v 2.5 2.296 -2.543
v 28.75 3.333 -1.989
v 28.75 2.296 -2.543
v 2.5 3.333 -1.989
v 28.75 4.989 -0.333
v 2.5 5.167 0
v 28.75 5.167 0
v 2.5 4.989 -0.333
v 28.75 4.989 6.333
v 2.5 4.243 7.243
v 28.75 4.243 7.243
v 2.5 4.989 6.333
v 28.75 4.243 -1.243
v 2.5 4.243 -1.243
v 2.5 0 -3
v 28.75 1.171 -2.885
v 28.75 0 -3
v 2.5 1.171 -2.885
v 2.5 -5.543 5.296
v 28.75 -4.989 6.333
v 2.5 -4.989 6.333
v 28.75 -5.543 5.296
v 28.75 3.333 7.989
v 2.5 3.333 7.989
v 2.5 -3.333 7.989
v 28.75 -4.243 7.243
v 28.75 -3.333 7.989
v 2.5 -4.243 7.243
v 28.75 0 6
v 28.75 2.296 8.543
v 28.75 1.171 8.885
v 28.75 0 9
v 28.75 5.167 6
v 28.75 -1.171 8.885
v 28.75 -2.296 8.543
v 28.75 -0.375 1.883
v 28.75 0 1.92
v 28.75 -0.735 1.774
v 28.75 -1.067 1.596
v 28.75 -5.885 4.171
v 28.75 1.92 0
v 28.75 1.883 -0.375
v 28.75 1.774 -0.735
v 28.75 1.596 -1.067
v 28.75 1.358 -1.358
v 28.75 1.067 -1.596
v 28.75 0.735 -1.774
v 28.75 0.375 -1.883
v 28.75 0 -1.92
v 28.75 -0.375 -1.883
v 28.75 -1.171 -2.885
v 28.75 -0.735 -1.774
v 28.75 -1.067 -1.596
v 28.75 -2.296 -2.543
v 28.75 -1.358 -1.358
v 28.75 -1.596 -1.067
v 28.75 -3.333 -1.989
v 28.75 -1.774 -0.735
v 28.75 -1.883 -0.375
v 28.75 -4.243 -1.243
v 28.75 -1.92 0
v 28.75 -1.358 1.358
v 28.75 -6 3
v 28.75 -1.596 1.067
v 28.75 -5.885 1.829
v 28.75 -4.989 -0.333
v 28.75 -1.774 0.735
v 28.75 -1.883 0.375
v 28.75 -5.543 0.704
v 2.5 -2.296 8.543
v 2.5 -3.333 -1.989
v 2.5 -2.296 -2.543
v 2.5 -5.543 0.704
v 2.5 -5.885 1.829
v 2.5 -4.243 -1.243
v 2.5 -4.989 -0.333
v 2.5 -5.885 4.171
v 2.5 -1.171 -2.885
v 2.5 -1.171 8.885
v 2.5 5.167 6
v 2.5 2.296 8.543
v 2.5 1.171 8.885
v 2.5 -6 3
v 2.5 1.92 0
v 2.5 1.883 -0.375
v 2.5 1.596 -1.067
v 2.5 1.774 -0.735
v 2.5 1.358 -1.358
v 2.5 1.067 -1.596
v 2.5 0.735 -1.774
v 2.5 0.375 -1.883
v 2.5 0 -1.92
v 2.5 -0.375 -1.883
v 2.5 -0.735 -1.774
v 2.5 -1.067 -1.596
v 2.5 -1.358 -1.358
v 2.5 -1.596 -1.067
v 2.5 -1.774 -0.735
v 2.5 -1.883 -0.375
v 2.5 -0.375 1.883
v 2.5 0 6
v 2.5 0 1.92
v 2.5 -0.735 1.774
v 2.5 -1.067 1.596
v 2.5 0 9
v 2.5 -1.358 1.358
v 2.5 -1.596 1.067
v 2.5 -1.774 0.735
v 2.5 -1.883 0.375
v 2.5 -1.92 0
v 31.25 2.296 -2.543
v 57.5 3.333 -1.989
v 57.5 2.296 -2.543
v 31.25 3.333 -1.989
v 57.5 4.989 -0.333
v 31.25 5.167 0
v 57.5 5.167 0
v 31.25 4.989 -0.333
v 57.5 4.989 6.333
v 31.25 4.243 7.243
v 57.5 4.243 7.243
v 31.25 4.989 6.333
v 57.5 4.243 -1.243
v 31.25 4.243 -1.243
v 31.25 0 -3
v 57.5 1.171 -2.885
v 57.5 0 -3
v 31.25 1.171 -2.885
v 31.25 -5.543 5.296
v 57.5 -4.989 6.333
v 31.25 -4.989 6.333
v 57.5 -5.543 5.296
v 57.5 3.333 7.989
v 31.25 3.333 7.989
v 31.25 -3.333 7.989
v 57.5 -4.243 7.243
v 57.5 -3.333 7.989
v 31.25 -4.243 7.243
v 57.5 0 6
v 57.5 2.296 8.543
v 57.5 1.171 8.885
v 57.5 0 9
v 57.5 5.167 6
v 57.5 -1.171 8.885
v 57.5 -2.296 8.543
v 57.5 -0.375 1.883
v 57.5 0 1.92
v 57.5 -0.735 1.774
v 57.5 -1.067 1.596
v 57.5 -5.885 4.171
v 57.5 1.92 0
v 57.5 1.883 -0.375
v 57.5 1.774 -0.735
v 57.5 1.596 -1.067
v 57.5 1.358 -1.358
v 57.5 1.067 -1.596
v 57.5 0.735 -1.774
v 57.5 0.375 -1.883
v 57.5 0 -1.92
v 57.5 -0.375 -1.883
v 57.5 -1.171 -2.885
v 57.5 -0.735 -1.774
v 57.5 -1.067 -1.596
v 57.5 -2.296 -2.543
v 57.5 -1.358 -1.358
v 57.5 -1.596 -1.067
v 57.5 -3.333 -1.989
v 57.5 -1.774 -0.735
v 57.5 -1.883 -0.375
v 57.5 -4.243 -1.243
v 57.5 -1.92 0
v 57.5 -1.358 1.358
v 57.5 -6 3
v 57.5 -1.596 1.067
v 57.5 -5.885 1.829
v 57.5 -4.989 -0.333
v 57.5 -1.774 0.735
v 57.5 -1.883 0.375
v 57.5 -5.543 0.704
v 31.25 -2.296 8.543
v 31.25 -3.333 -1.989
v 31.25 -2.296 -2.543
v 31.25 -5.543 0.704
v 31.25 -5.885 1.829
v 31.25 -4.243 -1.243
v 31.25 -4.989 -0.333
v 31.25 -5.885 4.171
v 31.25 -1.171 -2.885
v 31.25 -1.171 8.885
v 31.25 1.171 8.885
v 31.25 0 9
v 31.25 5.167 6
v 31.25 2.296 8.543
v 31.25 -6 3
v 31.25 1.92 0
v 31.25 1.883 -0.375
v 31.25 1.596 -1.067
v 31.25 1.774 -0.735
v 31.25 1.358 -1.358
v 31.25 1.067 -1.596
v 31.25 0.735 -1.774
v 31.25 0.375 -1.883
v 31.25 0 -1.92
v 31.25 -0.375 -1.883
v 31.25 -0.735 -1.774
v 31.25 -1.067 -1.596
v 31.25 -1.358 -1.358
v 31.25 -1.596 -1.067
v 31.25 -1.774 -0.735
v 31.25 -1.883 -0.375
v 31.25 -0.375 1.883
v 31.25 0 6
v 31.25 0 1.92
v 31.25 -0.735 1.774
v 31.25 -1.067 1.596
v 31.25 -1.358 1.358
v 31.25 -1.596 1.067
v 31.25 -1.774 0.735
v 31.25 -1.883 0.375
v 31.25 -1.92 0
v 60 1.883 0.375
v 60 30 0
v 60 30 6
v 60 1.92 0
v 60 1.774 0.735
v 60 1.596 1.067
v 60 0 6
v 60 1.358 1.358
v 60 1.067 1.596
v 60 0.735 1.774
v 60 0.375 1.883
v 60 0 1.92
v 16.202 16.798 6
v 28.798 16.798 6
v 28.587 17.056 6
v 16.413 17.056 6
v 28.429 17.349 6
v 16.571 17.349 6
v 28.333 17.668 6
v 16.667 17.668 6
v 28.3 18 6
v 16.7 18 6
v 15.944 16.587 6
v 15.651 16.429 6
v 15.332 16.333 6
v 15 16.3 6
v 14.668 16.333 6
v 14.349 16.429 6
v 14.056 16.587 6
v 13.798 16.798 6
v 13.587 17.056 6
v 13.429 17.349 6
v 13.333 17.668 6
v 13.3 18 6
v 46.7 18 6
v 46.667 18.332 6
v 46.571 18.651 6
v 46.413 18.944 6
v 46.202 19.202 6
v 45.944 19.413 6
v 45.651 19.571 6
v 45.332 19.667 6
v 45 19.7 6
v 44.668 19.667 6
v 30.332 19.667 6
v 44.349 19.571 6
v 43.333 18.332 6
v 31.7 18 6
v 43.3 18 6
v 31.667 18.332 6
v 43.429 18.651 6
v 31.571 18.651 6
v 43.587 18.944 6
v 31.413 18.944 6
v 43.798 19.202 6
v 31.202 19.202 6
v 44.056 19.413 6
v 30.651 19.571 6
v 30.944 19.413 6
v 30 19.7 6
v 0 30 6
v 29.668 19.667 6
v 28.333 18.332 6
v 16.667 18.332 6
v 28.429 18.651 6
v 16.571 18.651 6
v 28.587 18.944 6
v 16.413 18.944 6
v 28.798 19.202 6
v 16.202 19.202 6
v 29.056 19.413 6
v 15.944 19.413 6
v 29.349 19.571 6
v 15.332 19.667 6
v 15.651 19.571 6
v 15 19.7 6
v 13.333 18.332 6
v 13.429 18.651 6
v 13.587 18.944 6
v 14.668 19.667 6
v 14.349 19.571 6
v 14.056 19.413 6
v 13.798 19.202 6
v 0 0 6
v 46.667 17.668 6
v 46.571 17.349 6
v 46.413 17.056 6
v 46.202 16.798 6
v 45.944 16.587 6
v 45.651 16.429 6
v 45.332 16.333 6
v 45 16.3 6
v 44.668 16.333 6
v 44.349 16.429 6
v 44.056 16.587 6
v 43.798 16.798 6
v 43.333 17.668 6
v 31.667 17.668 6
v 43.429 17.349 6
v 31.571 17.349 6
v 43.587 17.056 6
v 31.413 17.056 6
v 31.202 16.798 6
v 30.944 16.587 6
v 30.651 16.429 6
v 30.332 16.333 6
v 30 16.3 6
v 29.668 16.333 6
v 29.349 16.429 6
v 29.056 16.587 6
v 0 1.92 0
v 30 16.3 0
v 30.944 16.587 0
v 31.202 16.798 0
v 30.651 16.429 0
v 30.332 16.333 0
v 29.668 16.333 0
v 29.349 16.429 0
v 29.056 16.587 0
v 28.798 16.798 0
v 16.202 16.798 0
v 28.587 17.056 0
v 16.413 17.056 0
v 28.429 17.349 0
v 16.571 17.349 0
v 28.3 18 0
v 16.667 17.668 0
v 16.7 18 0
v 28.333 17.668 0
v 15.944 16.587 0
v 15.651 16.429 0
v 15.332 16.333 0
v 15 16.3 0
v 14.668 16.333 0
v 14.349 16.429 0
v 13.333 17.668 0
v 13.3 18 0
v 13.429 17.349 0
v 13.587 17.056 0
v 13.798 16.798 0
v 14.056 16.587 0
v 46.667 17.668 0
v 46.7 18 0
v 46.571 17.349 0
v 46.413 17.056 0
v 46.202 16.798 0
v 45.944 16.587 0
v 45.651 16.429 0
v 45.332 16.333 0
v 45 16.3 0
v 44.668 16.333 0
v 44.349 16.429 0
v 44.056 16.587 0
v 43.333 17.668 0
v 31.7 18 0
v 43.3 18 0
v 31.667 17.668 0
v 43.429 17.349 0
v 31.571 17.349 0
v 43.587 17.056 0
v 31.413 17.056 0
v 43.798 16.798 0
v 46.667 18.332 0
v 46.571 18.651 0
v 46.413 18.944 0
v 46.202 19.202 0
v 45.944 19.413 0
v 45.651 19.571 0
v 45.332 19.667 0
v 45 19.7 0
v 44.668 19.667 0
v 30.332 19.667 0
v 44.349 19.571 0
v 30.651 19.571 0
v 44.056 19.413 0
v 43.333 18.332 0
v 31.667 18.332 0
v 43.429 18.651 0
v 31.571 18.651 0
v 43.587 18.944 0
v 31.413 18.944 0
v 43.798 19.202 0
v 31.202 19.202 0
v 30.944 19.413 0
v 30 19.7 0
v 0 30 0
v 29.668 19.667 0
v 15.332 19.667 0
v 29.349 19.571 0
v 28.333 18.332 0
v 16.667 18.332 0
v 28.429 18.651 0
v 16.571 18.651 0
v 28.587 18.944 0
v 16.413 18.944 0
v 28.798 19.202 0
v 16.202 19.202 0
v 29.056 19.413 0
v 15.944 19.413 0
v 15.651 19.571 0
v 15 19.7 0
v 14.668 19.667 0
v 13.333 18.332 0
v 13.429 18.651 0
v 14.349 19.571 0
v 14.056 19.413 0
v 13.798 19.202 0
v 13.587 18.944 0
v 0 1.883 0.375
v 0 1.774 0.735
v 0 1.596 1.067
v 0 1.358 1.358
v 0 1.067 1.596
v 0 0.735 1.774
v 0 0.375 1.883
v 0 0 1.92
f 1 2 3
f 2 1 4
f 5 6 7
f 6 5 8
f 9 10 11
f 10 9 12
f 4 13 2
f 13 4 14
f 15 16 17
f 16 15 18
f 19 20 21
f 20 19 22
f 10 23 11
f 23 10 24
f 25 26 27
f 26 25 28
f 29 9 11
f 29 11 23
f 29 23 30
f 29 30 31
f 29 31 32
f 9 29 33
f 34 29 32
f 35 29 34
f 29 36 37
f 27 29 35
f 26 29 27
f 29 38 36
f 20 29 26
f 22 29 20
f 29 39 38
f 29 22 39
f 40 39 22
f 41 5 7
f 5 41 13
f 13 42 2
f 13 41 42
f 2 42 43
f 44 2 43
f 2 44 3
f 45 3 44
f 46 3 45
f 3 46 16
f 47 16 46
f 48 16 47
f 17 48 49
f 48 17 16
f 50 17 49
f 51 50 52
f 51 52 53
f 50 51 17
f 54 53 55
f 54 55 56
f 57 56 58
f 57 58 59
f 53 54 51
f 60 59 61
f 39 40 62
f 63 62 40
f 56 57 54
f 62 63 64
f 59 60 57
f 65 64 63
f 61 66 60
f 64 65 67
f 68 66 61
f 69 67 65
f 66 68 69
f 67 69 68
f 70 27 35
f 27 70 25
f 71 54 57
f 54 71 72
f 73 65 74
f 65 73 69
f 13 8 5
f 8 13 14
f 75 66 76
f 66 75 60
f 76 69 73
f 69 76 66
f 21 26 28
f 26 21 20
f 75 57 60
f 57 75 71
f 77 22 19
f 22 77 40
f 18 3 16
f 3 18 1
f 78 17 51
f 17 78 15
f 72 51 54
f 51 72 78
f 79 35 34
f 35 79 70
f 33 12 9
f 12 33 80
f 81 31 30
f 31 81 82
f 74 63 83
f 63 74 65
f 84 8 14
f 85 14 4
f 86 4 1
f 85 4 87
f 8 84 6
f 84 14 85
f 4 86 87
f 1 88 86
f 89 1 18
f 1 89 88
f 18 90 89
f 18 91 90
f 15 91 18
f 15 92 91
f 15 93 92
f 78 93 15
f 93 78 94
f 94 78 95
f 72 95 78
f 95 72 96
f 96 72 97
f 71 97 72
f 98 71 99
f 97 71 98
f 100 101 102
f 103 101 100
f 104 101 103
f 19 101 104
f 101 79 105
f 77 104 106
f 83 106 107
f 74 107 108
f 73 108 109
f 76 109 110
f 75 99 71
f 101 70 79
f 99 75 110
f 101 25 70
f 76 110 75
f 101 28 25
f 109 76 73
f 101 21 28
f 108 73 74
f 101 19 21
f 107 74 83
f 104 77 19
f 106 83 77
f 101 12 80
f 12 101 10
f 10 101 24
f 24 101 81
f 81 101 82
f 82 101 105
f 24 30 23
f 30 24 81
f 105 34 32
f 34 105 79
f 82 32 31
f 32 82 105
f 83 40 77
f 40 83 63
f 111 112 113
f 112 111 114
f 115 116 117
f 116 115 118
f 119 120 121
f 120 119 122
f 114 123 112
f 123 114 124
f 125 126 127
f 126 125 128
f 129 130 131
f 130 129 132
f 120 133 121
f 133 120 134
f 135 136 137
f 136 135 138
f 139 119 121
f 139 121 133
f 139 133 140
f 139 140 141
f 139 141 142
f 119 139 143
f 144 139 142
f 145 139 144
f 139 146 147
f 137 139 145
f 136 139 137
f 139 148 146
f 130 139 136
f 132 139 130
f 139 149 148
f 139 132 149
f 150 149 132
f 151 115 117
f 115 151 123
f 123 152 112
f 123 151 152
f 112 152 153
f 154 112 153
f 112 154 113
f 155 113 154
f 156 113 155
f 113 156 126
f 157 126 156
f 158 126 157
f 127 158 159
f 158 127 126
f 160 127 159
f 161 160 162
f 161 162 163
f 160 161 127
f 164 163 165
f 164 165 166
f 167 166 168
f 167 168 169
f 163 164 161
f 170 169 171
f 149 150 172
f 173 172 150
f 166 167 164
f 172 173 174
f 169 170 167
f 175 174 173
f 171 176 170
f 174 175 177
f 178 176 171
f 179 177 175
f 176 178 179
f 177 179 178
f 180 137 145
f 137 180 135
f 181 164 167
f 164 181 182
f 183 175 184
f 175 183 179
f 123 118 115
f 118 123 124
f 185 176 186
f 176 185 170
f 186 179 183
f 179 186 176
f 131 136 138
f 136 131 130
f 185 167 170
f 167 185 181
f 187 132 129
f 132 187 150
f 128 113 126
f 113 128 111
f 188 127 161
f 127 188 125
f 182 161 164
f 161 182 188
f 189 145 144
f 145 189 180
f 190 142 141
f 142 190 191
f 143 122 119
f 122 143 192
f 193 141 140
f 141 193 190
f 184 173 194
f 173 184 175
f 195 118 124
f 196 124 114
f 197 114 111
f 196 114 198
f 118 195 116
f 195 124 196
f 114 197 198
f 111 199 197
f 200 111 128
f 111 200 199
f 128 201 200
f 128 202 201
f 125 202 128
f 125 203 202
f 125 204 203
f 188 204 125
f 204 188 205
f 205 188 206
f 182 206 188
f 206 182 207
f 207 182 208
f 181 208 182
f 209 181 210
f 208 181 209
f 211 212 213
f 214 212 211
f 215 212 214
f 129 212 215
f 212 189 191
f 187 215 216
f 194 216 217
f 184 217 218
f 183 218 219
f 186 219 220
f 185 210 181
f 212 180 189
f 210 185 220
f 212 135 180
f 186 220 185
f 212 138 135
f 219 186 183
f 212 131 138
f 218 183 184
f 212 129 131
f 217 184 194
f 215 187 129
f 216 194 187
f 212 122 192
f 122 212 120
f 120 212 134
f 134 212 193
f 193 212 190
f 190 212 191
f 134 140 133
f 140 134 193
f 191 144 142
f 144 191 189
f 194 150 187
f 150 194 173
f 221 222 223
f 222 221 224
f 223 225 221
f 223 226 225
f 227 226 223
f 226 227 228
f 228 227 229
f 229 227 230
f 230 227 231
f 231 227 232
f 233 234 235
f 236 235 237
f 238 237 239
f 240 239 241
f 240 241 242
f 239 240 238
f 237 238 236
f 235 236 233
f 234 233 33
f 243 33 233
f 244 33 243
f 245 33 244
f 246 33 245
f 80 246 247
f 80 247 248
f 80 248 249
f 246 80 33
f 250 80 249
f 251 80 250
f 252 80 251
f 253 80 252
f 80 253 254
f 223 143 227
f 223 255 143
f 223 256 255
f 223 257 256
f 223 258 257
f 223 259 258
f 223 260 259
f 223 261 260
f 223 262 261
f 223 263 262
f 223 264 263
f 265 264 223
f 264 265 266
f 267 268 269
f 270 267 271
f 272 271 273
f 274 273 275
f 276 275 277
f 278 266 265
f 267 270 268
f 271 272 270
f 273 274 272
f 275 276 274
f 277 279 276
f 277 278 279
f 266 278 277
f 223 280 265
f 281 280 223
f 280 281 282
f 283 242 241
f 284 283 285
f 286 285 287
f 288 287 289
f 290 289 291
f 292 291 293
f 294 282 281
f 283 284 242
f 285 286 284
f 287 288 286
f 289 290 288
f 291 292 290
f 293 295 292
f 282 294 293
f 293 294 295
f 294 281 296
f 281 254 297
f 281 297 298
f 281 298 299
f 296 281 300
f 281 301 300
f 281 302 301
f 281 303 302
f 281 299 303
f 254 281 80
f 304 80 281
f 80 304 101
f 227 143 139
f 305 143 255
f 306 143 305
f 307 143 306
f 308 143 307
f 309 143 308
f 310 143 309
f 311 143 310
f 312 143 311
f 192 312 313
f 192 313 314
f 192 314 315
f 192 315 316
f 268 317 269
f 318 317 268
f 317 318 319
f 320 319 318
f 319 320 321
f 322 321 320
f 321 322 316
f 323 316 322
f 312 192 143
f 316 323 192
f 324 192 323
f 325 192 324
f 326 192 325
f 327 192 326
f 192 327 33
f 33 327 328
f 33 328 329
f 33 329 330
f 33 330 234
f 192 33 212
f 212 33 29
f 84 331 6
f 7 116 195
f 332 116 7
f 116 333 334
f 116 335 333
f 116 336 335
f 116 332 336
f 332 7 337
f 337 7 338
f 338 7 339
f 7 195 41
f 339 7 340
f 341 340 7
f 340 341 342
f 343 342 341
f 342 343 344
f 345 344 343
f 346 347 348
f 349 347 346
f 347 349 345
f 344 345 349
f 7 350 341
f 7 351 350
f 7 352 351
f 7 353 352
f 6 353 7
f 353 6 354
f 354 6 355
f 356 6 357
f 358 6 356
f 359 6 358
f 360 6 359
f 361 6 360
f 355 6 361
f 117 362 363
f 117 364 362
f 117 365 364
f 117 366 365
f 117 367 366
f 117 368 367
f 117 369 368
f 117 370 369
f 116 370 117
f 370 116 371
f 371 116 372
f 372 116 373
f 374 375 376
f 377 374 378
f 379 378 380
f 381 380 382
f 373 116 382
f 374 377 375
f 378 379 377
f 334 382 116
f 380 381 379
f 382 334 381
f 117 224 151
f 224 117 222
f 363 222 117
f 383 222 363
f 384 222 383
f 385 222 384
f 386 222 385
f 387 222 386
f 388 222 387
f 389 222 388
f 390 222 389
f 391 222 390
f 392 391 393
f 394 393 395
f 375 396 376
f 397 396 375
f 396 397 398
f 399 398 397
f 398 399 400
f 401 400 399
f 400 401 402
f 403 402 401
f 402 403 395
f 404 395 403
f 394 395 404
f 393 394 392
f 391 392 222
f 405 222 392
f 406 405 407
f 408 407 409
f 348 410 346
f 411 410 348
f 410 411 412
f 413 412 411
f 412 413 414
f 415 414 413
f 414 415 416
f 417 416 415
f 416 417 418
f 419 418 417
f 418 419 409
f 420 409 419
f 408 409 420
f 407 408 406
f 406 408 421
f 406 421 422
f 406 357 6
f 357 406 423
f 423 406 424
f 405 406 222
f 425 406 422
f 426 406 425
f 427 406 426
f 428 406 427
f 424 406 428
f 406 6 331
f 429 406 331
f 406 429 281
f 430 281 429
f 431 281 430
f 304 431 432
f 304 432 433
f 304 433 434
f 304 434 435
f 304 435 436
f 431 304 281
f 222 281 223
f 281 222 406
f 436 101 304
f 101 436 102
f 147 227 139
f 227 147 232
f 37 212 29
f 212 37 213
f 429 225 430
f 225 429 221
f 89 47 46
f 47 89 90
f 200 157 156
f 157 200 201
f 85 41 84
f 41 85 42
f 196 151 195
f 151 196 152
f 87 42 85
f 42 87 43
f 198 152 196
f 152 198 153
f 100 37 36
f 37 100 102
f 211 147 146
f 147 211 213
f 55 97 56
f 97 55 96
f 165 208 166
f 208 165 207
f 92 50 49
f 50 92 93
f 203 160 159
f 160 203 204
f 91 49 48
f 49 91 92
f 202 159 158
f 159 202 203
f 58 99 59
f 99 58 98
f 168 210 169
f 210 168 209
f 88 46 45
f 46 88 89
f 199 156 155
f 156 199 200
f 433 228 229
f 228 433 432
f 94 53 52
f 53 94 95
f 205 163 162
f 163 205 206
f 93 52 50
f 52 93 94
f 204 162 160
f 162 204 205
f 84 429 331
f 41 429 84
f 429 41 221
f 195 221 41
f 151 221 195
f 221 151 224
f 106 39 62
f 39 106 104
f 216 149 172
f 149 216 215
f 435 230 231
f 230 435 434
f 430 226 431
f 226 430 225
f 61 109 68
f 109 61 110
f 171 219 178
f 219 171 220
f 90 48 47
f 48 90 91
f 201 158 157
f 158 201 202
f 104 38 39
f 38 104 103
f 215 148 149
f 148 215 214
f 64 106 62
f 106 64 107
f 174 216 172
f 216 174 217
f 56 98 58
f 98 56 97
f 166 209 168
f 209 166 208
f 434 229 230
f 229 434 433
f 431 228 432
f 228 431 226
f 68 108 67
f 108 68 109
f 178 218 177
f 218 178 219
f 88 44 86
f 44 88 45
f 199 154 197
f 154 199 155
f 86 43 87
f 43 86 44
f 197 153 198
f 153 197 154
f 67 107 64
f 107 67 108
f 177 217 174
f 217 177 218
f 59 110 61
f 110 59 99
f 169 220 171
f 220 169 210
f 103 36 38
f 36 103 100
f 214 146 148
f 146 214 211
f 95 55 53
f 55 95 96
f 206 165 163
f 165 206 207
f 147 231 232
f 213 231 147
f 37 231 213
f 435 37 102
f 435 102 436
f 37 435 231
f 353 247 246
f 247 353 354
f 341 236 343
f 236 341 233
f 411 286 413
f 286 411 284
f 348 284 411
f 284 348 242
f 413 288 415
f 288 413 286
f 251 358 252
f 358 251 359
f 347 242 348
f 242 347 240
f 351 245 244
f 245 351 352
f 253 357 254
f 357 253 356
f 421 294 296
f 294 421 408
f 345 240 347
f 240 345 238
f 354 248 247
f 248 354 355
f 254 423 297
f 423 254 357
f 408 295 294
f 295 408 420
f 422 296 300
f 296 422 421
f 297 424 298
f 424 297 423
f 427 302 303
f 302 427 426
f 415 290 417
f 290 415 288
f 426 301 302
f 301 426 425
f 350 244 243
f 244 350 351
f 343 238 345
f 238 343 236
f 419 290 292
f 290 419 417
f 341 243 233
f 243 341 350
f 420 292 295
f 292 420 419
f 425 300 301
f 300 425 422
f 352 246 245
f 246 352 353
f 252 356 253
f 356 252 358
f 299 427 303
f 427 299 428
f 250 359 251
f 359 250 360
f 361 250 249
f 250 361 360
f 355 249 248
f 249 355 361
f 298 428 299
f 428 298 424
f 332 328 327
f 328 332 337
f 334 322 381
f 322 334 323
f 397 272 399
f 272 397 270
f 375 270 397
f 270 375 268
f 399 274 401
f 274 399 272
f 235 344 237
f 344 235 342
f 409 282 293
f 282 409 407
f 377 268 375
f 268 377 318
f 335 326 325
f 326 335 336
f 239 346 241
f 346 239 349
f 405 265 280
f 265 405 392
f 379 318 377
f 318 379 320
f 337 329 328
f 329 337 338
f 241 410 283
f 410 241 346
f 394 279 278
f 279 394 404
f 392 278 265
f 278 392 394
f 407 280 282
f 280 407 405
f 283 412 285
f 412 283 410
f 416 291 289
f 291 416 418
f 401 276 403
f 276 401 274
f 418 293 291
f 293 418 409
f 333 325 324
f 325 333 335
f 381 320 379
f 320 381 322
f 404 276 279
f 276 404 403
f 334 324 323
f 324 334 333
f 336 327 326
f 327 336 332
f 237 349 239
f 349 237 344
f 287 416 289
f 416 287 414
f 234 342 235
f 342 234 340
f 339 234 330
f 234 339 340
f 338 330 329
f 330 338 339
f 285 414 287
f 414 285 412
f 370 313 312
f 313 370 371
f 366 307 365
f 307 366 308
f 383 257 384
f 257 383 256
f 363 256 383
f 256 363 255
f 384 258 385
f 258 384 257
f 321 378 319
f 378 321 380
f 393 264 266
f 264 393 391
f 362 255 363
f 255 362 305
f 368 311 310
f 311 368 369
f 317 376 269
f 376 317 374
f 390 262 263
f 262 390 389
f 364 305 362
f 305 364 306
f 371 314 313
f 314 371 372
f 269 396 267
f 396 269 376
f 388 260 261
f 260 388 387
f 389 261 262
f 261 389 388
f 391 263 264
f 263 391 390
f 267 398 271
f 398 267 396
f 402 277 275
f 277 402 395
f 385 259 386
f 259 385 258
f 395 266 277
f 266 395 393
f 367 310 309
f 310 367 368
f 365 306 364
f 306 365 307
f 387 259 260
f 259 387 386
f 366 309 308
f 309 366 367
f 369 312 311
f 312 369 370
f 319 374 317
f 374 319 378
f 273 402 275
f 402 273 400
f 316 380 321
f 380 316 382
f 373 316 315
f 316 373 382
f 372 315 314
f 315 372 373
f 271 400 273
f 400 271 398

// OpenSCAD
$fn = 32;

// ----------------------------------------------------------------------
// Hinge leaf: 60 x 36 x 12 mm
// ----------------------------------------------------------------------

// --- parameters (mm) ---
plate_len = 60;           // leaf length, X
plate_w = 30;             // leaf width, Y
plate_t = 6;              // leaf thickness
barrel_d = 12;            // knuckle diameter
barrel_w = 26.25;         // knuckle width
knuckle_n = 2;            // number of knuckles
pin_d = 3.84;             // pin bore
gap = 2.5;                // gap between the knuckles
screw_d = 3.4;            // screw clearance

module leaf() {
  cube([plate_len, plate_w, plate_t]);
}

module knuckles() {
  /* barrels sit on the leaf edge, the pin axis at half the leaf thickness */
  for (i = [0 : knuckle_n - 1])
    translate([gap + i * (barrel_w + gap), 0, plate_t * 0.5])
      rotate([0, 90, 0]) cylinder(h = barrel_w, d = barrel_d);
}

difference() {
  union() {
    leaf();
    knuckles();
  }
  rotate([0, 90, 0]) translate([0, 0, -1])
    cylinder(h = plate_len + 2, d = pin_d);
  translate([15, plate_w * 0.6, -1]) cylinder(h = plate_t + 2, d = screw_d);
  translate([30, plate_w * 0.6, -1]) cylinder(h = plate_t + 2, d = screw_d);
  translate([45, plate_w * 0.6, -1]) cylinder(h = plate_t + 2, d = screw_d);
}
